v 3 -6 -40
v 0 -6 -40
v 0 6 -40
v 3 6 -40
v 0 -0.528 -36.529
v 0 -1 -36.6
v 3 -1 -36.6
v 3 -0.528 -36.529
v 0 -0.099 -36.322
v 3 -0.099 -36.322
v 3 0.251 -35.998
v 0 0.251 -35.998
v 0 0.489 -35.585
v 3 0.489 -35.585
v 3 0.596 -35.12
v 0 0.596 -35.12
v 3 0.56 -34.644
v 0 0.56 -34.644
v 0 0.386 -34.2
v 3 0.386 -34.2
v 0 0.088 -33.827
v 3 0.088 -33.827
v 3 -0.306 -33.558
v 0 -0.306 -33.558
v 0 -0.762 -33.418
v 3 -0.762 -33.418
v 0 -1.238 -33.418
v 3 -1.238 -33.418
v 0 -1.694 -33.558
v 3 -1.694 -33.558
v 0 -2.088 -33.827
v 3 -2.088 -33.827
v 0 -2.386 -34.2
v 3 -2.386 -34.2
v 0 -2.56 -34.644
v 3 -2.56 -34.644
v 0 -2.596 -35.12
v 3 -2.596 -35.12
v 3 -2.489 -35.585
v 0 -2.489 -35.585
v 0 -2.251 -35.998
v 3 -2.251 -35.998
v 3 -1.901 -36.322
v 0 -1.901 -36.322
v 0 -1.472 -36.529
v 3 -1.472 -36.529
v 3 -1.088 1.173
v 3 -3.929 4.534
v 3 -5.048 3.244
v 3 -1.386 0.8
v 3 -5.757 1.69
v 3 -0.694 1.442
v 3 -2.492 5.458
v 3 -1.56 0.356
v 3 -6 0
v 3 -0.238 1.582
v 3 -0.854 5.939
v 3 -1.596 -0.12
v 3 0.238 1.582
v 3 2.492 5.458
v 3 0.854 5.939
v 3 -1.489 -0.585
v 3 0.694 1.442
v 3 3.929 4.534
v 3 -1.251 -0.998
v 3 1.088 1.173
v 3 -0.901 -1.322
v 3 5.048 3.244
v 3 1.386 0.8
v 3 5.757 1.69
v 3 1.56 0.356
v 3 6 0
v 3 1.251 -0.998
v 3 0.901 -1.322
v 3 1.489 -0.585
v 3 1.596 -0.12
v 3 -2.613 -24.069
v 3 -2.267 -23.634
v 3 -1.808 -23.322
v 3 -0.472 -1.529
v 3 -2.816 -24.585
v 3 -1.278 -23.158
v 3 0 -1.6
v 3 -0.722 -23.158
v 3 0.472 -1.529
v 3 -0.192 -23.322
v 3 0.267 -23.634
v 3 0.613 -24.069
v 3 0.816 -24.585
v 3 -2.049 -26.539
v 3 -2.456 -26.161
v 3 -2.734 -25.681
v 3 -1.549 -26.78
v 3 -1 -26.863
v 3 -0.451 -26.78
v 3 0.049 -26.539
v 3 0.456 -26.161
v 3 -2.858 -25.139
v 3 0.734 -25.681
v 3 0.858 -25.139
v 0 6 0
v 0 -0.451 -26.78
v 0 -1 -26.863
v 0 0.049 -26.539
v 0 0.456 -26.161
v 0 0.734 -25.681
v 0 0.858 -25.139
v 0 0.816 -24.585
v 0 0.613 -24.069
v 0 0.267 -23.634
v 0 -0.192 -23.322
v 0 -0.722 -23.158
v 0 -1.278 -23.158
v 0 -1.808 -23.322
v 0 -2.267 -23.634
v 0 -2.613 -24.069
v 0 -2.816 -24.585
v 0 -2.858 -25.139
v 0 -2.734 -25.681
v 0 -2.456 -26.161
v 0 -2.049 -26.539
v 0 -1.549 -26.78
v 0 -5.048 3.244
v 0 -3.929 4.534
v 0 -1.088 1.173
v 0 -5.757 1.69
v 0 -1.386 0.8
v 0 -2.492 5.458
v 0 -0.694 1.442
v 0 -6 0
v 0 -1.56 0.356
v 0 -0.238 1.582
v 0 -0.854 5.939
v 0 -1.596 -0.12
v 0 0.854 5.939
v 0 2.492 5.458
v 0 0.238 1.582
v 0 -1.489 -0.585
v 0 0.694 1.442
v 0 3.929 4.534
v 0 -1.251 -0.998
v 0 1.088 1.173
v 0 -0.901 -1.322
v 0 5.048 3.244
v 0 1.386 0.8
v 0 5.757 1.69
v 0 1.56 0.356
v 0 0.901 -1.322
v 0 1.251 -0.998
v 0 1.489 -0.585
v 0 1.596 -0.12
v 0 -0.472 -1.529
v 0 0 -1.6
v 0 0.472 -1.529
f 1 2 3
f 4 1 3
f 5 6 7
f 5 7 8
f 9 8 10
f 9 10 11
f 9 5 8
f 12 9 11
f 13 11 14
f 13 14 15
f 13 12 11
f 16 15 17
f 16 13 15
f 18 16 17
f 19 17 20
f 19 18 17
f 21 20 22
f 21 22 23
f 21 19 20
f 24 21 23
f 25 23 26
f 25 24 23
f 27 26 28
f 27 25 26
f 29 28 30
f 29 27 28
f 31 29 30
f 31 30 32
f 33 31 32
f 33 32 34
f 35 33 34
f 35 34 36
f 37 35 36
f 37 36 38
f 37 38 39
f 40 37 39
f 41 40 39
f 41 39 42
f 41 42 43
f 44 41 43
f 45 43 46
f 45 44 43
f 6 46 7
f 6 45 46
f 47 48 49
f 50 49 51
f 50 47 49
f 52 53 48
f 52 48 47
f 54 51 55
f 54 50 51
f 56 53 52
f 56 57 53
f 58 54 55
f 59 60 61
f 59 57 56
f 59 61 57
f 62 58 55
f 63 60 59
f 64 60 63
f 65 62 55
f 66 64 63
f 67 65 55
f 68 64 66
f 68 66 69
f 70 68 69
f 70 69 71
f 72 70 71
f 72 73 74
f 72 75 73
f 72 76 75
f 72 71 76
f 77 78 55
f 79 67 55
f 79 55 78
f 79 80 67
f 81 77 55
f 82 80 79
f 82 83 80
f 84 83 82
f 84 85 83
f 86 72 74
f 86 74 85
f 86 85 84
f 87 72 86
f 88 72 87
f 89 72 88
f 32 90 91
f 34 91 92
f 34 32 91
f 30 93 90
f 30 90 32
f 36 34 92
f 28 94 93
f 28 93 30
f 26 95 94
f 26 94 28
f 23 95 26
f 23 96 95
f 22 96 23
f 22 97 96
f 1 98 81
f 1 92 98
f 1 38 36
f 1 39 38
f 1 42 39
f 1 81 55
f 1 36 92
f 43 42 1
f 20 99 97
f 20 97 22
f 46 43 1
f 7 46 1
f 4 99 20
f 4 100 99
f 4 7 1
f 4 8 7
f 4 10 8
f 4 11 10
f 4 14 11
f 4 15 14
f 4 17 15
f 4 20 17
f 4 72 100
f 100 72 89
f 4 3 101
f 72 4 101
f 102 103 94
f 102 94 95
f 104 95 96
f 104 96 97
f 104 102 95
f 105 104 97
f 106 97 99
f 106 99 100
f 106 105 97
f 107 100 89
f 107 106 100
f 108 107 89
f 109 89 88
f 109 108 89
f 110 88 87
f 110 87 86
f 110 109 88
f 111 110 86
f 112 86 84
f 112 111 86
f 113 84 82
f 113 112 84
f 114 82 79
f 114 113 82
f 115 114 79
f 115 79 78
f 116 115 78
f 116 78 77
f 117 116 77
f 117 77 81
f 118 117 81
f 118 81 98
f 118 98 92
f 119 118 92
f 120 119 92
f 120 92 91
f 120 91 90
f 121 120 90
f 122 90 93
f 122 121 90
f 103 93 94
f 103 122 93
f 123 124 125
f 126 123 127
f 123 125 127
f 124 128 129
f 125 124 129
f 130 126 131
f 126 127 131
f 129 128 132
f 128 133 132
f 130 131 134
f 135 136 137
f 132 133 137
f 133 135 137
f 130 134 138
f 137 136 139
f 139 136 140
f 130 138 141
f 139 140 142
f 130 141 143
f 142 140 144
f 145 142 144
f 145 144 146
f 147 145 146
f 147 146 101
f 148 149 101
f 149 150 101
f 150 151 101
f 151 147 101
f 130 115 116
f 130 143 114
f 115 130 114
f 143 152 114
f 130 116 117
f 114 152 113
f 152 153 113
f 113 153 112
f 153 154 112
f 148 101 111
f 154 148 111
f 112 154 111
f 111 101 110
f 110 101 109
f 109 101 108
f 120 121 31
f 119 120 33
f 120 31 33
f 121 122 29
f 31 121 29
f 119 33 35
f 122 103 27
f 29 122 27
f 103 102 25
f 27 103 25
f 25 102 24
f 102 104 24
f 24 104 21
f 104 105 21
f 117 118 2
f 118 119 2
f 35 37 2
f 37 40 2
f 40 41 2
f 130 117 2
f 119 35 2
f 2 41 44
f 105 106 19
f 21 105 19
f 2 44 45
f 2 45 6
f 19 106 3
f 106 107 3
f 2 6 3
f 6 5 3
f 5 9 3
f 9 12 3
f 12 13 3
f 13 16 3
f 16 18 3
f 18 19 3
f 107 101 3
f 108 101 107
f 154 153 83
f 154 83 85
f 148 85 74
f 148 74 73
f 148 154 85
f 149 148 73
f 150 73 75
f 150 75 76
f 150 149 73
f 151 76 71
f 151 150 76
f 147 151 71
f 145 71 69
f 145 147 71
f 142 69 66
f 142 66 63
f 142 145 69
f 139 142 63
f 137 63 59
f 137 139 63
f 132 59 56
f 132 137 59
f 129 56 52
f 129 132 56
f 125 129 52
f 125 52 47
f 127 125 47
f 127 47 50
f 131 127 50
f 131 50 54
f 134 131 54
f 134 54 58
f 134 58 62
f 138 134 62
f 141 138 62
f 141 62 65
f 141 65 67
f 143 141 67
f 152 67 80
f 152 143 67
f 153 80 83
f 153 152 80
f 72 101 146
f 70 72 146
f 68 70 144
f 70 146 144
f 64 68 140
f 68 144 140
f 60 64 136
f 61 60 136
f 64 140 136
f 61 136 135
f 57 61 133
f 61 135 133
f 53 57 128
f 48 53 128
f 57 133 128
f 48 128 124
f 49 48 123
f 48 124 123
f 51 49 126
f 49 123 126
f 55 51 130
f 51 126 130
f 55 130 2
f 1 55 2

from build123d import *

# Parameters (mm, degrees)
SKETCH1_R           = 1.862815958
SKETCH1_R_2         = 1.6
BOSS_EXTRUDE1_DEPTH = 3


with BuildPart() as part:
    # Sketch1 → Boss-Extrude1 (new body)
    with BuildSketch(Plane(origin=(0, 0, 0), x_dir=(0, 0, -1), z_dir=(1, 0, 0))):
        with BuildLine():
            Line((40, 6), (0, 6))
            ThreePointArc((0, 6), (-6, 0), (0, -6))
            Line((0, -6), (40, -6))
            Line((40, -6), (40, 6))
        make_face()
        with Locations((25, -1)):
            Circle(SKETCH1_R, mode=Mode.SUBTRACT)
        with Locations((35, -1)):
            Circle(SKETCH1_R_2, mode=Mode.SUBTRACT)
        Circle(SKETCH1_R_2, mode=Mode.SUBTRACT)
    extrude(amount=BOSS_EXTRUDE1_DEPTH)


solid = part.part
